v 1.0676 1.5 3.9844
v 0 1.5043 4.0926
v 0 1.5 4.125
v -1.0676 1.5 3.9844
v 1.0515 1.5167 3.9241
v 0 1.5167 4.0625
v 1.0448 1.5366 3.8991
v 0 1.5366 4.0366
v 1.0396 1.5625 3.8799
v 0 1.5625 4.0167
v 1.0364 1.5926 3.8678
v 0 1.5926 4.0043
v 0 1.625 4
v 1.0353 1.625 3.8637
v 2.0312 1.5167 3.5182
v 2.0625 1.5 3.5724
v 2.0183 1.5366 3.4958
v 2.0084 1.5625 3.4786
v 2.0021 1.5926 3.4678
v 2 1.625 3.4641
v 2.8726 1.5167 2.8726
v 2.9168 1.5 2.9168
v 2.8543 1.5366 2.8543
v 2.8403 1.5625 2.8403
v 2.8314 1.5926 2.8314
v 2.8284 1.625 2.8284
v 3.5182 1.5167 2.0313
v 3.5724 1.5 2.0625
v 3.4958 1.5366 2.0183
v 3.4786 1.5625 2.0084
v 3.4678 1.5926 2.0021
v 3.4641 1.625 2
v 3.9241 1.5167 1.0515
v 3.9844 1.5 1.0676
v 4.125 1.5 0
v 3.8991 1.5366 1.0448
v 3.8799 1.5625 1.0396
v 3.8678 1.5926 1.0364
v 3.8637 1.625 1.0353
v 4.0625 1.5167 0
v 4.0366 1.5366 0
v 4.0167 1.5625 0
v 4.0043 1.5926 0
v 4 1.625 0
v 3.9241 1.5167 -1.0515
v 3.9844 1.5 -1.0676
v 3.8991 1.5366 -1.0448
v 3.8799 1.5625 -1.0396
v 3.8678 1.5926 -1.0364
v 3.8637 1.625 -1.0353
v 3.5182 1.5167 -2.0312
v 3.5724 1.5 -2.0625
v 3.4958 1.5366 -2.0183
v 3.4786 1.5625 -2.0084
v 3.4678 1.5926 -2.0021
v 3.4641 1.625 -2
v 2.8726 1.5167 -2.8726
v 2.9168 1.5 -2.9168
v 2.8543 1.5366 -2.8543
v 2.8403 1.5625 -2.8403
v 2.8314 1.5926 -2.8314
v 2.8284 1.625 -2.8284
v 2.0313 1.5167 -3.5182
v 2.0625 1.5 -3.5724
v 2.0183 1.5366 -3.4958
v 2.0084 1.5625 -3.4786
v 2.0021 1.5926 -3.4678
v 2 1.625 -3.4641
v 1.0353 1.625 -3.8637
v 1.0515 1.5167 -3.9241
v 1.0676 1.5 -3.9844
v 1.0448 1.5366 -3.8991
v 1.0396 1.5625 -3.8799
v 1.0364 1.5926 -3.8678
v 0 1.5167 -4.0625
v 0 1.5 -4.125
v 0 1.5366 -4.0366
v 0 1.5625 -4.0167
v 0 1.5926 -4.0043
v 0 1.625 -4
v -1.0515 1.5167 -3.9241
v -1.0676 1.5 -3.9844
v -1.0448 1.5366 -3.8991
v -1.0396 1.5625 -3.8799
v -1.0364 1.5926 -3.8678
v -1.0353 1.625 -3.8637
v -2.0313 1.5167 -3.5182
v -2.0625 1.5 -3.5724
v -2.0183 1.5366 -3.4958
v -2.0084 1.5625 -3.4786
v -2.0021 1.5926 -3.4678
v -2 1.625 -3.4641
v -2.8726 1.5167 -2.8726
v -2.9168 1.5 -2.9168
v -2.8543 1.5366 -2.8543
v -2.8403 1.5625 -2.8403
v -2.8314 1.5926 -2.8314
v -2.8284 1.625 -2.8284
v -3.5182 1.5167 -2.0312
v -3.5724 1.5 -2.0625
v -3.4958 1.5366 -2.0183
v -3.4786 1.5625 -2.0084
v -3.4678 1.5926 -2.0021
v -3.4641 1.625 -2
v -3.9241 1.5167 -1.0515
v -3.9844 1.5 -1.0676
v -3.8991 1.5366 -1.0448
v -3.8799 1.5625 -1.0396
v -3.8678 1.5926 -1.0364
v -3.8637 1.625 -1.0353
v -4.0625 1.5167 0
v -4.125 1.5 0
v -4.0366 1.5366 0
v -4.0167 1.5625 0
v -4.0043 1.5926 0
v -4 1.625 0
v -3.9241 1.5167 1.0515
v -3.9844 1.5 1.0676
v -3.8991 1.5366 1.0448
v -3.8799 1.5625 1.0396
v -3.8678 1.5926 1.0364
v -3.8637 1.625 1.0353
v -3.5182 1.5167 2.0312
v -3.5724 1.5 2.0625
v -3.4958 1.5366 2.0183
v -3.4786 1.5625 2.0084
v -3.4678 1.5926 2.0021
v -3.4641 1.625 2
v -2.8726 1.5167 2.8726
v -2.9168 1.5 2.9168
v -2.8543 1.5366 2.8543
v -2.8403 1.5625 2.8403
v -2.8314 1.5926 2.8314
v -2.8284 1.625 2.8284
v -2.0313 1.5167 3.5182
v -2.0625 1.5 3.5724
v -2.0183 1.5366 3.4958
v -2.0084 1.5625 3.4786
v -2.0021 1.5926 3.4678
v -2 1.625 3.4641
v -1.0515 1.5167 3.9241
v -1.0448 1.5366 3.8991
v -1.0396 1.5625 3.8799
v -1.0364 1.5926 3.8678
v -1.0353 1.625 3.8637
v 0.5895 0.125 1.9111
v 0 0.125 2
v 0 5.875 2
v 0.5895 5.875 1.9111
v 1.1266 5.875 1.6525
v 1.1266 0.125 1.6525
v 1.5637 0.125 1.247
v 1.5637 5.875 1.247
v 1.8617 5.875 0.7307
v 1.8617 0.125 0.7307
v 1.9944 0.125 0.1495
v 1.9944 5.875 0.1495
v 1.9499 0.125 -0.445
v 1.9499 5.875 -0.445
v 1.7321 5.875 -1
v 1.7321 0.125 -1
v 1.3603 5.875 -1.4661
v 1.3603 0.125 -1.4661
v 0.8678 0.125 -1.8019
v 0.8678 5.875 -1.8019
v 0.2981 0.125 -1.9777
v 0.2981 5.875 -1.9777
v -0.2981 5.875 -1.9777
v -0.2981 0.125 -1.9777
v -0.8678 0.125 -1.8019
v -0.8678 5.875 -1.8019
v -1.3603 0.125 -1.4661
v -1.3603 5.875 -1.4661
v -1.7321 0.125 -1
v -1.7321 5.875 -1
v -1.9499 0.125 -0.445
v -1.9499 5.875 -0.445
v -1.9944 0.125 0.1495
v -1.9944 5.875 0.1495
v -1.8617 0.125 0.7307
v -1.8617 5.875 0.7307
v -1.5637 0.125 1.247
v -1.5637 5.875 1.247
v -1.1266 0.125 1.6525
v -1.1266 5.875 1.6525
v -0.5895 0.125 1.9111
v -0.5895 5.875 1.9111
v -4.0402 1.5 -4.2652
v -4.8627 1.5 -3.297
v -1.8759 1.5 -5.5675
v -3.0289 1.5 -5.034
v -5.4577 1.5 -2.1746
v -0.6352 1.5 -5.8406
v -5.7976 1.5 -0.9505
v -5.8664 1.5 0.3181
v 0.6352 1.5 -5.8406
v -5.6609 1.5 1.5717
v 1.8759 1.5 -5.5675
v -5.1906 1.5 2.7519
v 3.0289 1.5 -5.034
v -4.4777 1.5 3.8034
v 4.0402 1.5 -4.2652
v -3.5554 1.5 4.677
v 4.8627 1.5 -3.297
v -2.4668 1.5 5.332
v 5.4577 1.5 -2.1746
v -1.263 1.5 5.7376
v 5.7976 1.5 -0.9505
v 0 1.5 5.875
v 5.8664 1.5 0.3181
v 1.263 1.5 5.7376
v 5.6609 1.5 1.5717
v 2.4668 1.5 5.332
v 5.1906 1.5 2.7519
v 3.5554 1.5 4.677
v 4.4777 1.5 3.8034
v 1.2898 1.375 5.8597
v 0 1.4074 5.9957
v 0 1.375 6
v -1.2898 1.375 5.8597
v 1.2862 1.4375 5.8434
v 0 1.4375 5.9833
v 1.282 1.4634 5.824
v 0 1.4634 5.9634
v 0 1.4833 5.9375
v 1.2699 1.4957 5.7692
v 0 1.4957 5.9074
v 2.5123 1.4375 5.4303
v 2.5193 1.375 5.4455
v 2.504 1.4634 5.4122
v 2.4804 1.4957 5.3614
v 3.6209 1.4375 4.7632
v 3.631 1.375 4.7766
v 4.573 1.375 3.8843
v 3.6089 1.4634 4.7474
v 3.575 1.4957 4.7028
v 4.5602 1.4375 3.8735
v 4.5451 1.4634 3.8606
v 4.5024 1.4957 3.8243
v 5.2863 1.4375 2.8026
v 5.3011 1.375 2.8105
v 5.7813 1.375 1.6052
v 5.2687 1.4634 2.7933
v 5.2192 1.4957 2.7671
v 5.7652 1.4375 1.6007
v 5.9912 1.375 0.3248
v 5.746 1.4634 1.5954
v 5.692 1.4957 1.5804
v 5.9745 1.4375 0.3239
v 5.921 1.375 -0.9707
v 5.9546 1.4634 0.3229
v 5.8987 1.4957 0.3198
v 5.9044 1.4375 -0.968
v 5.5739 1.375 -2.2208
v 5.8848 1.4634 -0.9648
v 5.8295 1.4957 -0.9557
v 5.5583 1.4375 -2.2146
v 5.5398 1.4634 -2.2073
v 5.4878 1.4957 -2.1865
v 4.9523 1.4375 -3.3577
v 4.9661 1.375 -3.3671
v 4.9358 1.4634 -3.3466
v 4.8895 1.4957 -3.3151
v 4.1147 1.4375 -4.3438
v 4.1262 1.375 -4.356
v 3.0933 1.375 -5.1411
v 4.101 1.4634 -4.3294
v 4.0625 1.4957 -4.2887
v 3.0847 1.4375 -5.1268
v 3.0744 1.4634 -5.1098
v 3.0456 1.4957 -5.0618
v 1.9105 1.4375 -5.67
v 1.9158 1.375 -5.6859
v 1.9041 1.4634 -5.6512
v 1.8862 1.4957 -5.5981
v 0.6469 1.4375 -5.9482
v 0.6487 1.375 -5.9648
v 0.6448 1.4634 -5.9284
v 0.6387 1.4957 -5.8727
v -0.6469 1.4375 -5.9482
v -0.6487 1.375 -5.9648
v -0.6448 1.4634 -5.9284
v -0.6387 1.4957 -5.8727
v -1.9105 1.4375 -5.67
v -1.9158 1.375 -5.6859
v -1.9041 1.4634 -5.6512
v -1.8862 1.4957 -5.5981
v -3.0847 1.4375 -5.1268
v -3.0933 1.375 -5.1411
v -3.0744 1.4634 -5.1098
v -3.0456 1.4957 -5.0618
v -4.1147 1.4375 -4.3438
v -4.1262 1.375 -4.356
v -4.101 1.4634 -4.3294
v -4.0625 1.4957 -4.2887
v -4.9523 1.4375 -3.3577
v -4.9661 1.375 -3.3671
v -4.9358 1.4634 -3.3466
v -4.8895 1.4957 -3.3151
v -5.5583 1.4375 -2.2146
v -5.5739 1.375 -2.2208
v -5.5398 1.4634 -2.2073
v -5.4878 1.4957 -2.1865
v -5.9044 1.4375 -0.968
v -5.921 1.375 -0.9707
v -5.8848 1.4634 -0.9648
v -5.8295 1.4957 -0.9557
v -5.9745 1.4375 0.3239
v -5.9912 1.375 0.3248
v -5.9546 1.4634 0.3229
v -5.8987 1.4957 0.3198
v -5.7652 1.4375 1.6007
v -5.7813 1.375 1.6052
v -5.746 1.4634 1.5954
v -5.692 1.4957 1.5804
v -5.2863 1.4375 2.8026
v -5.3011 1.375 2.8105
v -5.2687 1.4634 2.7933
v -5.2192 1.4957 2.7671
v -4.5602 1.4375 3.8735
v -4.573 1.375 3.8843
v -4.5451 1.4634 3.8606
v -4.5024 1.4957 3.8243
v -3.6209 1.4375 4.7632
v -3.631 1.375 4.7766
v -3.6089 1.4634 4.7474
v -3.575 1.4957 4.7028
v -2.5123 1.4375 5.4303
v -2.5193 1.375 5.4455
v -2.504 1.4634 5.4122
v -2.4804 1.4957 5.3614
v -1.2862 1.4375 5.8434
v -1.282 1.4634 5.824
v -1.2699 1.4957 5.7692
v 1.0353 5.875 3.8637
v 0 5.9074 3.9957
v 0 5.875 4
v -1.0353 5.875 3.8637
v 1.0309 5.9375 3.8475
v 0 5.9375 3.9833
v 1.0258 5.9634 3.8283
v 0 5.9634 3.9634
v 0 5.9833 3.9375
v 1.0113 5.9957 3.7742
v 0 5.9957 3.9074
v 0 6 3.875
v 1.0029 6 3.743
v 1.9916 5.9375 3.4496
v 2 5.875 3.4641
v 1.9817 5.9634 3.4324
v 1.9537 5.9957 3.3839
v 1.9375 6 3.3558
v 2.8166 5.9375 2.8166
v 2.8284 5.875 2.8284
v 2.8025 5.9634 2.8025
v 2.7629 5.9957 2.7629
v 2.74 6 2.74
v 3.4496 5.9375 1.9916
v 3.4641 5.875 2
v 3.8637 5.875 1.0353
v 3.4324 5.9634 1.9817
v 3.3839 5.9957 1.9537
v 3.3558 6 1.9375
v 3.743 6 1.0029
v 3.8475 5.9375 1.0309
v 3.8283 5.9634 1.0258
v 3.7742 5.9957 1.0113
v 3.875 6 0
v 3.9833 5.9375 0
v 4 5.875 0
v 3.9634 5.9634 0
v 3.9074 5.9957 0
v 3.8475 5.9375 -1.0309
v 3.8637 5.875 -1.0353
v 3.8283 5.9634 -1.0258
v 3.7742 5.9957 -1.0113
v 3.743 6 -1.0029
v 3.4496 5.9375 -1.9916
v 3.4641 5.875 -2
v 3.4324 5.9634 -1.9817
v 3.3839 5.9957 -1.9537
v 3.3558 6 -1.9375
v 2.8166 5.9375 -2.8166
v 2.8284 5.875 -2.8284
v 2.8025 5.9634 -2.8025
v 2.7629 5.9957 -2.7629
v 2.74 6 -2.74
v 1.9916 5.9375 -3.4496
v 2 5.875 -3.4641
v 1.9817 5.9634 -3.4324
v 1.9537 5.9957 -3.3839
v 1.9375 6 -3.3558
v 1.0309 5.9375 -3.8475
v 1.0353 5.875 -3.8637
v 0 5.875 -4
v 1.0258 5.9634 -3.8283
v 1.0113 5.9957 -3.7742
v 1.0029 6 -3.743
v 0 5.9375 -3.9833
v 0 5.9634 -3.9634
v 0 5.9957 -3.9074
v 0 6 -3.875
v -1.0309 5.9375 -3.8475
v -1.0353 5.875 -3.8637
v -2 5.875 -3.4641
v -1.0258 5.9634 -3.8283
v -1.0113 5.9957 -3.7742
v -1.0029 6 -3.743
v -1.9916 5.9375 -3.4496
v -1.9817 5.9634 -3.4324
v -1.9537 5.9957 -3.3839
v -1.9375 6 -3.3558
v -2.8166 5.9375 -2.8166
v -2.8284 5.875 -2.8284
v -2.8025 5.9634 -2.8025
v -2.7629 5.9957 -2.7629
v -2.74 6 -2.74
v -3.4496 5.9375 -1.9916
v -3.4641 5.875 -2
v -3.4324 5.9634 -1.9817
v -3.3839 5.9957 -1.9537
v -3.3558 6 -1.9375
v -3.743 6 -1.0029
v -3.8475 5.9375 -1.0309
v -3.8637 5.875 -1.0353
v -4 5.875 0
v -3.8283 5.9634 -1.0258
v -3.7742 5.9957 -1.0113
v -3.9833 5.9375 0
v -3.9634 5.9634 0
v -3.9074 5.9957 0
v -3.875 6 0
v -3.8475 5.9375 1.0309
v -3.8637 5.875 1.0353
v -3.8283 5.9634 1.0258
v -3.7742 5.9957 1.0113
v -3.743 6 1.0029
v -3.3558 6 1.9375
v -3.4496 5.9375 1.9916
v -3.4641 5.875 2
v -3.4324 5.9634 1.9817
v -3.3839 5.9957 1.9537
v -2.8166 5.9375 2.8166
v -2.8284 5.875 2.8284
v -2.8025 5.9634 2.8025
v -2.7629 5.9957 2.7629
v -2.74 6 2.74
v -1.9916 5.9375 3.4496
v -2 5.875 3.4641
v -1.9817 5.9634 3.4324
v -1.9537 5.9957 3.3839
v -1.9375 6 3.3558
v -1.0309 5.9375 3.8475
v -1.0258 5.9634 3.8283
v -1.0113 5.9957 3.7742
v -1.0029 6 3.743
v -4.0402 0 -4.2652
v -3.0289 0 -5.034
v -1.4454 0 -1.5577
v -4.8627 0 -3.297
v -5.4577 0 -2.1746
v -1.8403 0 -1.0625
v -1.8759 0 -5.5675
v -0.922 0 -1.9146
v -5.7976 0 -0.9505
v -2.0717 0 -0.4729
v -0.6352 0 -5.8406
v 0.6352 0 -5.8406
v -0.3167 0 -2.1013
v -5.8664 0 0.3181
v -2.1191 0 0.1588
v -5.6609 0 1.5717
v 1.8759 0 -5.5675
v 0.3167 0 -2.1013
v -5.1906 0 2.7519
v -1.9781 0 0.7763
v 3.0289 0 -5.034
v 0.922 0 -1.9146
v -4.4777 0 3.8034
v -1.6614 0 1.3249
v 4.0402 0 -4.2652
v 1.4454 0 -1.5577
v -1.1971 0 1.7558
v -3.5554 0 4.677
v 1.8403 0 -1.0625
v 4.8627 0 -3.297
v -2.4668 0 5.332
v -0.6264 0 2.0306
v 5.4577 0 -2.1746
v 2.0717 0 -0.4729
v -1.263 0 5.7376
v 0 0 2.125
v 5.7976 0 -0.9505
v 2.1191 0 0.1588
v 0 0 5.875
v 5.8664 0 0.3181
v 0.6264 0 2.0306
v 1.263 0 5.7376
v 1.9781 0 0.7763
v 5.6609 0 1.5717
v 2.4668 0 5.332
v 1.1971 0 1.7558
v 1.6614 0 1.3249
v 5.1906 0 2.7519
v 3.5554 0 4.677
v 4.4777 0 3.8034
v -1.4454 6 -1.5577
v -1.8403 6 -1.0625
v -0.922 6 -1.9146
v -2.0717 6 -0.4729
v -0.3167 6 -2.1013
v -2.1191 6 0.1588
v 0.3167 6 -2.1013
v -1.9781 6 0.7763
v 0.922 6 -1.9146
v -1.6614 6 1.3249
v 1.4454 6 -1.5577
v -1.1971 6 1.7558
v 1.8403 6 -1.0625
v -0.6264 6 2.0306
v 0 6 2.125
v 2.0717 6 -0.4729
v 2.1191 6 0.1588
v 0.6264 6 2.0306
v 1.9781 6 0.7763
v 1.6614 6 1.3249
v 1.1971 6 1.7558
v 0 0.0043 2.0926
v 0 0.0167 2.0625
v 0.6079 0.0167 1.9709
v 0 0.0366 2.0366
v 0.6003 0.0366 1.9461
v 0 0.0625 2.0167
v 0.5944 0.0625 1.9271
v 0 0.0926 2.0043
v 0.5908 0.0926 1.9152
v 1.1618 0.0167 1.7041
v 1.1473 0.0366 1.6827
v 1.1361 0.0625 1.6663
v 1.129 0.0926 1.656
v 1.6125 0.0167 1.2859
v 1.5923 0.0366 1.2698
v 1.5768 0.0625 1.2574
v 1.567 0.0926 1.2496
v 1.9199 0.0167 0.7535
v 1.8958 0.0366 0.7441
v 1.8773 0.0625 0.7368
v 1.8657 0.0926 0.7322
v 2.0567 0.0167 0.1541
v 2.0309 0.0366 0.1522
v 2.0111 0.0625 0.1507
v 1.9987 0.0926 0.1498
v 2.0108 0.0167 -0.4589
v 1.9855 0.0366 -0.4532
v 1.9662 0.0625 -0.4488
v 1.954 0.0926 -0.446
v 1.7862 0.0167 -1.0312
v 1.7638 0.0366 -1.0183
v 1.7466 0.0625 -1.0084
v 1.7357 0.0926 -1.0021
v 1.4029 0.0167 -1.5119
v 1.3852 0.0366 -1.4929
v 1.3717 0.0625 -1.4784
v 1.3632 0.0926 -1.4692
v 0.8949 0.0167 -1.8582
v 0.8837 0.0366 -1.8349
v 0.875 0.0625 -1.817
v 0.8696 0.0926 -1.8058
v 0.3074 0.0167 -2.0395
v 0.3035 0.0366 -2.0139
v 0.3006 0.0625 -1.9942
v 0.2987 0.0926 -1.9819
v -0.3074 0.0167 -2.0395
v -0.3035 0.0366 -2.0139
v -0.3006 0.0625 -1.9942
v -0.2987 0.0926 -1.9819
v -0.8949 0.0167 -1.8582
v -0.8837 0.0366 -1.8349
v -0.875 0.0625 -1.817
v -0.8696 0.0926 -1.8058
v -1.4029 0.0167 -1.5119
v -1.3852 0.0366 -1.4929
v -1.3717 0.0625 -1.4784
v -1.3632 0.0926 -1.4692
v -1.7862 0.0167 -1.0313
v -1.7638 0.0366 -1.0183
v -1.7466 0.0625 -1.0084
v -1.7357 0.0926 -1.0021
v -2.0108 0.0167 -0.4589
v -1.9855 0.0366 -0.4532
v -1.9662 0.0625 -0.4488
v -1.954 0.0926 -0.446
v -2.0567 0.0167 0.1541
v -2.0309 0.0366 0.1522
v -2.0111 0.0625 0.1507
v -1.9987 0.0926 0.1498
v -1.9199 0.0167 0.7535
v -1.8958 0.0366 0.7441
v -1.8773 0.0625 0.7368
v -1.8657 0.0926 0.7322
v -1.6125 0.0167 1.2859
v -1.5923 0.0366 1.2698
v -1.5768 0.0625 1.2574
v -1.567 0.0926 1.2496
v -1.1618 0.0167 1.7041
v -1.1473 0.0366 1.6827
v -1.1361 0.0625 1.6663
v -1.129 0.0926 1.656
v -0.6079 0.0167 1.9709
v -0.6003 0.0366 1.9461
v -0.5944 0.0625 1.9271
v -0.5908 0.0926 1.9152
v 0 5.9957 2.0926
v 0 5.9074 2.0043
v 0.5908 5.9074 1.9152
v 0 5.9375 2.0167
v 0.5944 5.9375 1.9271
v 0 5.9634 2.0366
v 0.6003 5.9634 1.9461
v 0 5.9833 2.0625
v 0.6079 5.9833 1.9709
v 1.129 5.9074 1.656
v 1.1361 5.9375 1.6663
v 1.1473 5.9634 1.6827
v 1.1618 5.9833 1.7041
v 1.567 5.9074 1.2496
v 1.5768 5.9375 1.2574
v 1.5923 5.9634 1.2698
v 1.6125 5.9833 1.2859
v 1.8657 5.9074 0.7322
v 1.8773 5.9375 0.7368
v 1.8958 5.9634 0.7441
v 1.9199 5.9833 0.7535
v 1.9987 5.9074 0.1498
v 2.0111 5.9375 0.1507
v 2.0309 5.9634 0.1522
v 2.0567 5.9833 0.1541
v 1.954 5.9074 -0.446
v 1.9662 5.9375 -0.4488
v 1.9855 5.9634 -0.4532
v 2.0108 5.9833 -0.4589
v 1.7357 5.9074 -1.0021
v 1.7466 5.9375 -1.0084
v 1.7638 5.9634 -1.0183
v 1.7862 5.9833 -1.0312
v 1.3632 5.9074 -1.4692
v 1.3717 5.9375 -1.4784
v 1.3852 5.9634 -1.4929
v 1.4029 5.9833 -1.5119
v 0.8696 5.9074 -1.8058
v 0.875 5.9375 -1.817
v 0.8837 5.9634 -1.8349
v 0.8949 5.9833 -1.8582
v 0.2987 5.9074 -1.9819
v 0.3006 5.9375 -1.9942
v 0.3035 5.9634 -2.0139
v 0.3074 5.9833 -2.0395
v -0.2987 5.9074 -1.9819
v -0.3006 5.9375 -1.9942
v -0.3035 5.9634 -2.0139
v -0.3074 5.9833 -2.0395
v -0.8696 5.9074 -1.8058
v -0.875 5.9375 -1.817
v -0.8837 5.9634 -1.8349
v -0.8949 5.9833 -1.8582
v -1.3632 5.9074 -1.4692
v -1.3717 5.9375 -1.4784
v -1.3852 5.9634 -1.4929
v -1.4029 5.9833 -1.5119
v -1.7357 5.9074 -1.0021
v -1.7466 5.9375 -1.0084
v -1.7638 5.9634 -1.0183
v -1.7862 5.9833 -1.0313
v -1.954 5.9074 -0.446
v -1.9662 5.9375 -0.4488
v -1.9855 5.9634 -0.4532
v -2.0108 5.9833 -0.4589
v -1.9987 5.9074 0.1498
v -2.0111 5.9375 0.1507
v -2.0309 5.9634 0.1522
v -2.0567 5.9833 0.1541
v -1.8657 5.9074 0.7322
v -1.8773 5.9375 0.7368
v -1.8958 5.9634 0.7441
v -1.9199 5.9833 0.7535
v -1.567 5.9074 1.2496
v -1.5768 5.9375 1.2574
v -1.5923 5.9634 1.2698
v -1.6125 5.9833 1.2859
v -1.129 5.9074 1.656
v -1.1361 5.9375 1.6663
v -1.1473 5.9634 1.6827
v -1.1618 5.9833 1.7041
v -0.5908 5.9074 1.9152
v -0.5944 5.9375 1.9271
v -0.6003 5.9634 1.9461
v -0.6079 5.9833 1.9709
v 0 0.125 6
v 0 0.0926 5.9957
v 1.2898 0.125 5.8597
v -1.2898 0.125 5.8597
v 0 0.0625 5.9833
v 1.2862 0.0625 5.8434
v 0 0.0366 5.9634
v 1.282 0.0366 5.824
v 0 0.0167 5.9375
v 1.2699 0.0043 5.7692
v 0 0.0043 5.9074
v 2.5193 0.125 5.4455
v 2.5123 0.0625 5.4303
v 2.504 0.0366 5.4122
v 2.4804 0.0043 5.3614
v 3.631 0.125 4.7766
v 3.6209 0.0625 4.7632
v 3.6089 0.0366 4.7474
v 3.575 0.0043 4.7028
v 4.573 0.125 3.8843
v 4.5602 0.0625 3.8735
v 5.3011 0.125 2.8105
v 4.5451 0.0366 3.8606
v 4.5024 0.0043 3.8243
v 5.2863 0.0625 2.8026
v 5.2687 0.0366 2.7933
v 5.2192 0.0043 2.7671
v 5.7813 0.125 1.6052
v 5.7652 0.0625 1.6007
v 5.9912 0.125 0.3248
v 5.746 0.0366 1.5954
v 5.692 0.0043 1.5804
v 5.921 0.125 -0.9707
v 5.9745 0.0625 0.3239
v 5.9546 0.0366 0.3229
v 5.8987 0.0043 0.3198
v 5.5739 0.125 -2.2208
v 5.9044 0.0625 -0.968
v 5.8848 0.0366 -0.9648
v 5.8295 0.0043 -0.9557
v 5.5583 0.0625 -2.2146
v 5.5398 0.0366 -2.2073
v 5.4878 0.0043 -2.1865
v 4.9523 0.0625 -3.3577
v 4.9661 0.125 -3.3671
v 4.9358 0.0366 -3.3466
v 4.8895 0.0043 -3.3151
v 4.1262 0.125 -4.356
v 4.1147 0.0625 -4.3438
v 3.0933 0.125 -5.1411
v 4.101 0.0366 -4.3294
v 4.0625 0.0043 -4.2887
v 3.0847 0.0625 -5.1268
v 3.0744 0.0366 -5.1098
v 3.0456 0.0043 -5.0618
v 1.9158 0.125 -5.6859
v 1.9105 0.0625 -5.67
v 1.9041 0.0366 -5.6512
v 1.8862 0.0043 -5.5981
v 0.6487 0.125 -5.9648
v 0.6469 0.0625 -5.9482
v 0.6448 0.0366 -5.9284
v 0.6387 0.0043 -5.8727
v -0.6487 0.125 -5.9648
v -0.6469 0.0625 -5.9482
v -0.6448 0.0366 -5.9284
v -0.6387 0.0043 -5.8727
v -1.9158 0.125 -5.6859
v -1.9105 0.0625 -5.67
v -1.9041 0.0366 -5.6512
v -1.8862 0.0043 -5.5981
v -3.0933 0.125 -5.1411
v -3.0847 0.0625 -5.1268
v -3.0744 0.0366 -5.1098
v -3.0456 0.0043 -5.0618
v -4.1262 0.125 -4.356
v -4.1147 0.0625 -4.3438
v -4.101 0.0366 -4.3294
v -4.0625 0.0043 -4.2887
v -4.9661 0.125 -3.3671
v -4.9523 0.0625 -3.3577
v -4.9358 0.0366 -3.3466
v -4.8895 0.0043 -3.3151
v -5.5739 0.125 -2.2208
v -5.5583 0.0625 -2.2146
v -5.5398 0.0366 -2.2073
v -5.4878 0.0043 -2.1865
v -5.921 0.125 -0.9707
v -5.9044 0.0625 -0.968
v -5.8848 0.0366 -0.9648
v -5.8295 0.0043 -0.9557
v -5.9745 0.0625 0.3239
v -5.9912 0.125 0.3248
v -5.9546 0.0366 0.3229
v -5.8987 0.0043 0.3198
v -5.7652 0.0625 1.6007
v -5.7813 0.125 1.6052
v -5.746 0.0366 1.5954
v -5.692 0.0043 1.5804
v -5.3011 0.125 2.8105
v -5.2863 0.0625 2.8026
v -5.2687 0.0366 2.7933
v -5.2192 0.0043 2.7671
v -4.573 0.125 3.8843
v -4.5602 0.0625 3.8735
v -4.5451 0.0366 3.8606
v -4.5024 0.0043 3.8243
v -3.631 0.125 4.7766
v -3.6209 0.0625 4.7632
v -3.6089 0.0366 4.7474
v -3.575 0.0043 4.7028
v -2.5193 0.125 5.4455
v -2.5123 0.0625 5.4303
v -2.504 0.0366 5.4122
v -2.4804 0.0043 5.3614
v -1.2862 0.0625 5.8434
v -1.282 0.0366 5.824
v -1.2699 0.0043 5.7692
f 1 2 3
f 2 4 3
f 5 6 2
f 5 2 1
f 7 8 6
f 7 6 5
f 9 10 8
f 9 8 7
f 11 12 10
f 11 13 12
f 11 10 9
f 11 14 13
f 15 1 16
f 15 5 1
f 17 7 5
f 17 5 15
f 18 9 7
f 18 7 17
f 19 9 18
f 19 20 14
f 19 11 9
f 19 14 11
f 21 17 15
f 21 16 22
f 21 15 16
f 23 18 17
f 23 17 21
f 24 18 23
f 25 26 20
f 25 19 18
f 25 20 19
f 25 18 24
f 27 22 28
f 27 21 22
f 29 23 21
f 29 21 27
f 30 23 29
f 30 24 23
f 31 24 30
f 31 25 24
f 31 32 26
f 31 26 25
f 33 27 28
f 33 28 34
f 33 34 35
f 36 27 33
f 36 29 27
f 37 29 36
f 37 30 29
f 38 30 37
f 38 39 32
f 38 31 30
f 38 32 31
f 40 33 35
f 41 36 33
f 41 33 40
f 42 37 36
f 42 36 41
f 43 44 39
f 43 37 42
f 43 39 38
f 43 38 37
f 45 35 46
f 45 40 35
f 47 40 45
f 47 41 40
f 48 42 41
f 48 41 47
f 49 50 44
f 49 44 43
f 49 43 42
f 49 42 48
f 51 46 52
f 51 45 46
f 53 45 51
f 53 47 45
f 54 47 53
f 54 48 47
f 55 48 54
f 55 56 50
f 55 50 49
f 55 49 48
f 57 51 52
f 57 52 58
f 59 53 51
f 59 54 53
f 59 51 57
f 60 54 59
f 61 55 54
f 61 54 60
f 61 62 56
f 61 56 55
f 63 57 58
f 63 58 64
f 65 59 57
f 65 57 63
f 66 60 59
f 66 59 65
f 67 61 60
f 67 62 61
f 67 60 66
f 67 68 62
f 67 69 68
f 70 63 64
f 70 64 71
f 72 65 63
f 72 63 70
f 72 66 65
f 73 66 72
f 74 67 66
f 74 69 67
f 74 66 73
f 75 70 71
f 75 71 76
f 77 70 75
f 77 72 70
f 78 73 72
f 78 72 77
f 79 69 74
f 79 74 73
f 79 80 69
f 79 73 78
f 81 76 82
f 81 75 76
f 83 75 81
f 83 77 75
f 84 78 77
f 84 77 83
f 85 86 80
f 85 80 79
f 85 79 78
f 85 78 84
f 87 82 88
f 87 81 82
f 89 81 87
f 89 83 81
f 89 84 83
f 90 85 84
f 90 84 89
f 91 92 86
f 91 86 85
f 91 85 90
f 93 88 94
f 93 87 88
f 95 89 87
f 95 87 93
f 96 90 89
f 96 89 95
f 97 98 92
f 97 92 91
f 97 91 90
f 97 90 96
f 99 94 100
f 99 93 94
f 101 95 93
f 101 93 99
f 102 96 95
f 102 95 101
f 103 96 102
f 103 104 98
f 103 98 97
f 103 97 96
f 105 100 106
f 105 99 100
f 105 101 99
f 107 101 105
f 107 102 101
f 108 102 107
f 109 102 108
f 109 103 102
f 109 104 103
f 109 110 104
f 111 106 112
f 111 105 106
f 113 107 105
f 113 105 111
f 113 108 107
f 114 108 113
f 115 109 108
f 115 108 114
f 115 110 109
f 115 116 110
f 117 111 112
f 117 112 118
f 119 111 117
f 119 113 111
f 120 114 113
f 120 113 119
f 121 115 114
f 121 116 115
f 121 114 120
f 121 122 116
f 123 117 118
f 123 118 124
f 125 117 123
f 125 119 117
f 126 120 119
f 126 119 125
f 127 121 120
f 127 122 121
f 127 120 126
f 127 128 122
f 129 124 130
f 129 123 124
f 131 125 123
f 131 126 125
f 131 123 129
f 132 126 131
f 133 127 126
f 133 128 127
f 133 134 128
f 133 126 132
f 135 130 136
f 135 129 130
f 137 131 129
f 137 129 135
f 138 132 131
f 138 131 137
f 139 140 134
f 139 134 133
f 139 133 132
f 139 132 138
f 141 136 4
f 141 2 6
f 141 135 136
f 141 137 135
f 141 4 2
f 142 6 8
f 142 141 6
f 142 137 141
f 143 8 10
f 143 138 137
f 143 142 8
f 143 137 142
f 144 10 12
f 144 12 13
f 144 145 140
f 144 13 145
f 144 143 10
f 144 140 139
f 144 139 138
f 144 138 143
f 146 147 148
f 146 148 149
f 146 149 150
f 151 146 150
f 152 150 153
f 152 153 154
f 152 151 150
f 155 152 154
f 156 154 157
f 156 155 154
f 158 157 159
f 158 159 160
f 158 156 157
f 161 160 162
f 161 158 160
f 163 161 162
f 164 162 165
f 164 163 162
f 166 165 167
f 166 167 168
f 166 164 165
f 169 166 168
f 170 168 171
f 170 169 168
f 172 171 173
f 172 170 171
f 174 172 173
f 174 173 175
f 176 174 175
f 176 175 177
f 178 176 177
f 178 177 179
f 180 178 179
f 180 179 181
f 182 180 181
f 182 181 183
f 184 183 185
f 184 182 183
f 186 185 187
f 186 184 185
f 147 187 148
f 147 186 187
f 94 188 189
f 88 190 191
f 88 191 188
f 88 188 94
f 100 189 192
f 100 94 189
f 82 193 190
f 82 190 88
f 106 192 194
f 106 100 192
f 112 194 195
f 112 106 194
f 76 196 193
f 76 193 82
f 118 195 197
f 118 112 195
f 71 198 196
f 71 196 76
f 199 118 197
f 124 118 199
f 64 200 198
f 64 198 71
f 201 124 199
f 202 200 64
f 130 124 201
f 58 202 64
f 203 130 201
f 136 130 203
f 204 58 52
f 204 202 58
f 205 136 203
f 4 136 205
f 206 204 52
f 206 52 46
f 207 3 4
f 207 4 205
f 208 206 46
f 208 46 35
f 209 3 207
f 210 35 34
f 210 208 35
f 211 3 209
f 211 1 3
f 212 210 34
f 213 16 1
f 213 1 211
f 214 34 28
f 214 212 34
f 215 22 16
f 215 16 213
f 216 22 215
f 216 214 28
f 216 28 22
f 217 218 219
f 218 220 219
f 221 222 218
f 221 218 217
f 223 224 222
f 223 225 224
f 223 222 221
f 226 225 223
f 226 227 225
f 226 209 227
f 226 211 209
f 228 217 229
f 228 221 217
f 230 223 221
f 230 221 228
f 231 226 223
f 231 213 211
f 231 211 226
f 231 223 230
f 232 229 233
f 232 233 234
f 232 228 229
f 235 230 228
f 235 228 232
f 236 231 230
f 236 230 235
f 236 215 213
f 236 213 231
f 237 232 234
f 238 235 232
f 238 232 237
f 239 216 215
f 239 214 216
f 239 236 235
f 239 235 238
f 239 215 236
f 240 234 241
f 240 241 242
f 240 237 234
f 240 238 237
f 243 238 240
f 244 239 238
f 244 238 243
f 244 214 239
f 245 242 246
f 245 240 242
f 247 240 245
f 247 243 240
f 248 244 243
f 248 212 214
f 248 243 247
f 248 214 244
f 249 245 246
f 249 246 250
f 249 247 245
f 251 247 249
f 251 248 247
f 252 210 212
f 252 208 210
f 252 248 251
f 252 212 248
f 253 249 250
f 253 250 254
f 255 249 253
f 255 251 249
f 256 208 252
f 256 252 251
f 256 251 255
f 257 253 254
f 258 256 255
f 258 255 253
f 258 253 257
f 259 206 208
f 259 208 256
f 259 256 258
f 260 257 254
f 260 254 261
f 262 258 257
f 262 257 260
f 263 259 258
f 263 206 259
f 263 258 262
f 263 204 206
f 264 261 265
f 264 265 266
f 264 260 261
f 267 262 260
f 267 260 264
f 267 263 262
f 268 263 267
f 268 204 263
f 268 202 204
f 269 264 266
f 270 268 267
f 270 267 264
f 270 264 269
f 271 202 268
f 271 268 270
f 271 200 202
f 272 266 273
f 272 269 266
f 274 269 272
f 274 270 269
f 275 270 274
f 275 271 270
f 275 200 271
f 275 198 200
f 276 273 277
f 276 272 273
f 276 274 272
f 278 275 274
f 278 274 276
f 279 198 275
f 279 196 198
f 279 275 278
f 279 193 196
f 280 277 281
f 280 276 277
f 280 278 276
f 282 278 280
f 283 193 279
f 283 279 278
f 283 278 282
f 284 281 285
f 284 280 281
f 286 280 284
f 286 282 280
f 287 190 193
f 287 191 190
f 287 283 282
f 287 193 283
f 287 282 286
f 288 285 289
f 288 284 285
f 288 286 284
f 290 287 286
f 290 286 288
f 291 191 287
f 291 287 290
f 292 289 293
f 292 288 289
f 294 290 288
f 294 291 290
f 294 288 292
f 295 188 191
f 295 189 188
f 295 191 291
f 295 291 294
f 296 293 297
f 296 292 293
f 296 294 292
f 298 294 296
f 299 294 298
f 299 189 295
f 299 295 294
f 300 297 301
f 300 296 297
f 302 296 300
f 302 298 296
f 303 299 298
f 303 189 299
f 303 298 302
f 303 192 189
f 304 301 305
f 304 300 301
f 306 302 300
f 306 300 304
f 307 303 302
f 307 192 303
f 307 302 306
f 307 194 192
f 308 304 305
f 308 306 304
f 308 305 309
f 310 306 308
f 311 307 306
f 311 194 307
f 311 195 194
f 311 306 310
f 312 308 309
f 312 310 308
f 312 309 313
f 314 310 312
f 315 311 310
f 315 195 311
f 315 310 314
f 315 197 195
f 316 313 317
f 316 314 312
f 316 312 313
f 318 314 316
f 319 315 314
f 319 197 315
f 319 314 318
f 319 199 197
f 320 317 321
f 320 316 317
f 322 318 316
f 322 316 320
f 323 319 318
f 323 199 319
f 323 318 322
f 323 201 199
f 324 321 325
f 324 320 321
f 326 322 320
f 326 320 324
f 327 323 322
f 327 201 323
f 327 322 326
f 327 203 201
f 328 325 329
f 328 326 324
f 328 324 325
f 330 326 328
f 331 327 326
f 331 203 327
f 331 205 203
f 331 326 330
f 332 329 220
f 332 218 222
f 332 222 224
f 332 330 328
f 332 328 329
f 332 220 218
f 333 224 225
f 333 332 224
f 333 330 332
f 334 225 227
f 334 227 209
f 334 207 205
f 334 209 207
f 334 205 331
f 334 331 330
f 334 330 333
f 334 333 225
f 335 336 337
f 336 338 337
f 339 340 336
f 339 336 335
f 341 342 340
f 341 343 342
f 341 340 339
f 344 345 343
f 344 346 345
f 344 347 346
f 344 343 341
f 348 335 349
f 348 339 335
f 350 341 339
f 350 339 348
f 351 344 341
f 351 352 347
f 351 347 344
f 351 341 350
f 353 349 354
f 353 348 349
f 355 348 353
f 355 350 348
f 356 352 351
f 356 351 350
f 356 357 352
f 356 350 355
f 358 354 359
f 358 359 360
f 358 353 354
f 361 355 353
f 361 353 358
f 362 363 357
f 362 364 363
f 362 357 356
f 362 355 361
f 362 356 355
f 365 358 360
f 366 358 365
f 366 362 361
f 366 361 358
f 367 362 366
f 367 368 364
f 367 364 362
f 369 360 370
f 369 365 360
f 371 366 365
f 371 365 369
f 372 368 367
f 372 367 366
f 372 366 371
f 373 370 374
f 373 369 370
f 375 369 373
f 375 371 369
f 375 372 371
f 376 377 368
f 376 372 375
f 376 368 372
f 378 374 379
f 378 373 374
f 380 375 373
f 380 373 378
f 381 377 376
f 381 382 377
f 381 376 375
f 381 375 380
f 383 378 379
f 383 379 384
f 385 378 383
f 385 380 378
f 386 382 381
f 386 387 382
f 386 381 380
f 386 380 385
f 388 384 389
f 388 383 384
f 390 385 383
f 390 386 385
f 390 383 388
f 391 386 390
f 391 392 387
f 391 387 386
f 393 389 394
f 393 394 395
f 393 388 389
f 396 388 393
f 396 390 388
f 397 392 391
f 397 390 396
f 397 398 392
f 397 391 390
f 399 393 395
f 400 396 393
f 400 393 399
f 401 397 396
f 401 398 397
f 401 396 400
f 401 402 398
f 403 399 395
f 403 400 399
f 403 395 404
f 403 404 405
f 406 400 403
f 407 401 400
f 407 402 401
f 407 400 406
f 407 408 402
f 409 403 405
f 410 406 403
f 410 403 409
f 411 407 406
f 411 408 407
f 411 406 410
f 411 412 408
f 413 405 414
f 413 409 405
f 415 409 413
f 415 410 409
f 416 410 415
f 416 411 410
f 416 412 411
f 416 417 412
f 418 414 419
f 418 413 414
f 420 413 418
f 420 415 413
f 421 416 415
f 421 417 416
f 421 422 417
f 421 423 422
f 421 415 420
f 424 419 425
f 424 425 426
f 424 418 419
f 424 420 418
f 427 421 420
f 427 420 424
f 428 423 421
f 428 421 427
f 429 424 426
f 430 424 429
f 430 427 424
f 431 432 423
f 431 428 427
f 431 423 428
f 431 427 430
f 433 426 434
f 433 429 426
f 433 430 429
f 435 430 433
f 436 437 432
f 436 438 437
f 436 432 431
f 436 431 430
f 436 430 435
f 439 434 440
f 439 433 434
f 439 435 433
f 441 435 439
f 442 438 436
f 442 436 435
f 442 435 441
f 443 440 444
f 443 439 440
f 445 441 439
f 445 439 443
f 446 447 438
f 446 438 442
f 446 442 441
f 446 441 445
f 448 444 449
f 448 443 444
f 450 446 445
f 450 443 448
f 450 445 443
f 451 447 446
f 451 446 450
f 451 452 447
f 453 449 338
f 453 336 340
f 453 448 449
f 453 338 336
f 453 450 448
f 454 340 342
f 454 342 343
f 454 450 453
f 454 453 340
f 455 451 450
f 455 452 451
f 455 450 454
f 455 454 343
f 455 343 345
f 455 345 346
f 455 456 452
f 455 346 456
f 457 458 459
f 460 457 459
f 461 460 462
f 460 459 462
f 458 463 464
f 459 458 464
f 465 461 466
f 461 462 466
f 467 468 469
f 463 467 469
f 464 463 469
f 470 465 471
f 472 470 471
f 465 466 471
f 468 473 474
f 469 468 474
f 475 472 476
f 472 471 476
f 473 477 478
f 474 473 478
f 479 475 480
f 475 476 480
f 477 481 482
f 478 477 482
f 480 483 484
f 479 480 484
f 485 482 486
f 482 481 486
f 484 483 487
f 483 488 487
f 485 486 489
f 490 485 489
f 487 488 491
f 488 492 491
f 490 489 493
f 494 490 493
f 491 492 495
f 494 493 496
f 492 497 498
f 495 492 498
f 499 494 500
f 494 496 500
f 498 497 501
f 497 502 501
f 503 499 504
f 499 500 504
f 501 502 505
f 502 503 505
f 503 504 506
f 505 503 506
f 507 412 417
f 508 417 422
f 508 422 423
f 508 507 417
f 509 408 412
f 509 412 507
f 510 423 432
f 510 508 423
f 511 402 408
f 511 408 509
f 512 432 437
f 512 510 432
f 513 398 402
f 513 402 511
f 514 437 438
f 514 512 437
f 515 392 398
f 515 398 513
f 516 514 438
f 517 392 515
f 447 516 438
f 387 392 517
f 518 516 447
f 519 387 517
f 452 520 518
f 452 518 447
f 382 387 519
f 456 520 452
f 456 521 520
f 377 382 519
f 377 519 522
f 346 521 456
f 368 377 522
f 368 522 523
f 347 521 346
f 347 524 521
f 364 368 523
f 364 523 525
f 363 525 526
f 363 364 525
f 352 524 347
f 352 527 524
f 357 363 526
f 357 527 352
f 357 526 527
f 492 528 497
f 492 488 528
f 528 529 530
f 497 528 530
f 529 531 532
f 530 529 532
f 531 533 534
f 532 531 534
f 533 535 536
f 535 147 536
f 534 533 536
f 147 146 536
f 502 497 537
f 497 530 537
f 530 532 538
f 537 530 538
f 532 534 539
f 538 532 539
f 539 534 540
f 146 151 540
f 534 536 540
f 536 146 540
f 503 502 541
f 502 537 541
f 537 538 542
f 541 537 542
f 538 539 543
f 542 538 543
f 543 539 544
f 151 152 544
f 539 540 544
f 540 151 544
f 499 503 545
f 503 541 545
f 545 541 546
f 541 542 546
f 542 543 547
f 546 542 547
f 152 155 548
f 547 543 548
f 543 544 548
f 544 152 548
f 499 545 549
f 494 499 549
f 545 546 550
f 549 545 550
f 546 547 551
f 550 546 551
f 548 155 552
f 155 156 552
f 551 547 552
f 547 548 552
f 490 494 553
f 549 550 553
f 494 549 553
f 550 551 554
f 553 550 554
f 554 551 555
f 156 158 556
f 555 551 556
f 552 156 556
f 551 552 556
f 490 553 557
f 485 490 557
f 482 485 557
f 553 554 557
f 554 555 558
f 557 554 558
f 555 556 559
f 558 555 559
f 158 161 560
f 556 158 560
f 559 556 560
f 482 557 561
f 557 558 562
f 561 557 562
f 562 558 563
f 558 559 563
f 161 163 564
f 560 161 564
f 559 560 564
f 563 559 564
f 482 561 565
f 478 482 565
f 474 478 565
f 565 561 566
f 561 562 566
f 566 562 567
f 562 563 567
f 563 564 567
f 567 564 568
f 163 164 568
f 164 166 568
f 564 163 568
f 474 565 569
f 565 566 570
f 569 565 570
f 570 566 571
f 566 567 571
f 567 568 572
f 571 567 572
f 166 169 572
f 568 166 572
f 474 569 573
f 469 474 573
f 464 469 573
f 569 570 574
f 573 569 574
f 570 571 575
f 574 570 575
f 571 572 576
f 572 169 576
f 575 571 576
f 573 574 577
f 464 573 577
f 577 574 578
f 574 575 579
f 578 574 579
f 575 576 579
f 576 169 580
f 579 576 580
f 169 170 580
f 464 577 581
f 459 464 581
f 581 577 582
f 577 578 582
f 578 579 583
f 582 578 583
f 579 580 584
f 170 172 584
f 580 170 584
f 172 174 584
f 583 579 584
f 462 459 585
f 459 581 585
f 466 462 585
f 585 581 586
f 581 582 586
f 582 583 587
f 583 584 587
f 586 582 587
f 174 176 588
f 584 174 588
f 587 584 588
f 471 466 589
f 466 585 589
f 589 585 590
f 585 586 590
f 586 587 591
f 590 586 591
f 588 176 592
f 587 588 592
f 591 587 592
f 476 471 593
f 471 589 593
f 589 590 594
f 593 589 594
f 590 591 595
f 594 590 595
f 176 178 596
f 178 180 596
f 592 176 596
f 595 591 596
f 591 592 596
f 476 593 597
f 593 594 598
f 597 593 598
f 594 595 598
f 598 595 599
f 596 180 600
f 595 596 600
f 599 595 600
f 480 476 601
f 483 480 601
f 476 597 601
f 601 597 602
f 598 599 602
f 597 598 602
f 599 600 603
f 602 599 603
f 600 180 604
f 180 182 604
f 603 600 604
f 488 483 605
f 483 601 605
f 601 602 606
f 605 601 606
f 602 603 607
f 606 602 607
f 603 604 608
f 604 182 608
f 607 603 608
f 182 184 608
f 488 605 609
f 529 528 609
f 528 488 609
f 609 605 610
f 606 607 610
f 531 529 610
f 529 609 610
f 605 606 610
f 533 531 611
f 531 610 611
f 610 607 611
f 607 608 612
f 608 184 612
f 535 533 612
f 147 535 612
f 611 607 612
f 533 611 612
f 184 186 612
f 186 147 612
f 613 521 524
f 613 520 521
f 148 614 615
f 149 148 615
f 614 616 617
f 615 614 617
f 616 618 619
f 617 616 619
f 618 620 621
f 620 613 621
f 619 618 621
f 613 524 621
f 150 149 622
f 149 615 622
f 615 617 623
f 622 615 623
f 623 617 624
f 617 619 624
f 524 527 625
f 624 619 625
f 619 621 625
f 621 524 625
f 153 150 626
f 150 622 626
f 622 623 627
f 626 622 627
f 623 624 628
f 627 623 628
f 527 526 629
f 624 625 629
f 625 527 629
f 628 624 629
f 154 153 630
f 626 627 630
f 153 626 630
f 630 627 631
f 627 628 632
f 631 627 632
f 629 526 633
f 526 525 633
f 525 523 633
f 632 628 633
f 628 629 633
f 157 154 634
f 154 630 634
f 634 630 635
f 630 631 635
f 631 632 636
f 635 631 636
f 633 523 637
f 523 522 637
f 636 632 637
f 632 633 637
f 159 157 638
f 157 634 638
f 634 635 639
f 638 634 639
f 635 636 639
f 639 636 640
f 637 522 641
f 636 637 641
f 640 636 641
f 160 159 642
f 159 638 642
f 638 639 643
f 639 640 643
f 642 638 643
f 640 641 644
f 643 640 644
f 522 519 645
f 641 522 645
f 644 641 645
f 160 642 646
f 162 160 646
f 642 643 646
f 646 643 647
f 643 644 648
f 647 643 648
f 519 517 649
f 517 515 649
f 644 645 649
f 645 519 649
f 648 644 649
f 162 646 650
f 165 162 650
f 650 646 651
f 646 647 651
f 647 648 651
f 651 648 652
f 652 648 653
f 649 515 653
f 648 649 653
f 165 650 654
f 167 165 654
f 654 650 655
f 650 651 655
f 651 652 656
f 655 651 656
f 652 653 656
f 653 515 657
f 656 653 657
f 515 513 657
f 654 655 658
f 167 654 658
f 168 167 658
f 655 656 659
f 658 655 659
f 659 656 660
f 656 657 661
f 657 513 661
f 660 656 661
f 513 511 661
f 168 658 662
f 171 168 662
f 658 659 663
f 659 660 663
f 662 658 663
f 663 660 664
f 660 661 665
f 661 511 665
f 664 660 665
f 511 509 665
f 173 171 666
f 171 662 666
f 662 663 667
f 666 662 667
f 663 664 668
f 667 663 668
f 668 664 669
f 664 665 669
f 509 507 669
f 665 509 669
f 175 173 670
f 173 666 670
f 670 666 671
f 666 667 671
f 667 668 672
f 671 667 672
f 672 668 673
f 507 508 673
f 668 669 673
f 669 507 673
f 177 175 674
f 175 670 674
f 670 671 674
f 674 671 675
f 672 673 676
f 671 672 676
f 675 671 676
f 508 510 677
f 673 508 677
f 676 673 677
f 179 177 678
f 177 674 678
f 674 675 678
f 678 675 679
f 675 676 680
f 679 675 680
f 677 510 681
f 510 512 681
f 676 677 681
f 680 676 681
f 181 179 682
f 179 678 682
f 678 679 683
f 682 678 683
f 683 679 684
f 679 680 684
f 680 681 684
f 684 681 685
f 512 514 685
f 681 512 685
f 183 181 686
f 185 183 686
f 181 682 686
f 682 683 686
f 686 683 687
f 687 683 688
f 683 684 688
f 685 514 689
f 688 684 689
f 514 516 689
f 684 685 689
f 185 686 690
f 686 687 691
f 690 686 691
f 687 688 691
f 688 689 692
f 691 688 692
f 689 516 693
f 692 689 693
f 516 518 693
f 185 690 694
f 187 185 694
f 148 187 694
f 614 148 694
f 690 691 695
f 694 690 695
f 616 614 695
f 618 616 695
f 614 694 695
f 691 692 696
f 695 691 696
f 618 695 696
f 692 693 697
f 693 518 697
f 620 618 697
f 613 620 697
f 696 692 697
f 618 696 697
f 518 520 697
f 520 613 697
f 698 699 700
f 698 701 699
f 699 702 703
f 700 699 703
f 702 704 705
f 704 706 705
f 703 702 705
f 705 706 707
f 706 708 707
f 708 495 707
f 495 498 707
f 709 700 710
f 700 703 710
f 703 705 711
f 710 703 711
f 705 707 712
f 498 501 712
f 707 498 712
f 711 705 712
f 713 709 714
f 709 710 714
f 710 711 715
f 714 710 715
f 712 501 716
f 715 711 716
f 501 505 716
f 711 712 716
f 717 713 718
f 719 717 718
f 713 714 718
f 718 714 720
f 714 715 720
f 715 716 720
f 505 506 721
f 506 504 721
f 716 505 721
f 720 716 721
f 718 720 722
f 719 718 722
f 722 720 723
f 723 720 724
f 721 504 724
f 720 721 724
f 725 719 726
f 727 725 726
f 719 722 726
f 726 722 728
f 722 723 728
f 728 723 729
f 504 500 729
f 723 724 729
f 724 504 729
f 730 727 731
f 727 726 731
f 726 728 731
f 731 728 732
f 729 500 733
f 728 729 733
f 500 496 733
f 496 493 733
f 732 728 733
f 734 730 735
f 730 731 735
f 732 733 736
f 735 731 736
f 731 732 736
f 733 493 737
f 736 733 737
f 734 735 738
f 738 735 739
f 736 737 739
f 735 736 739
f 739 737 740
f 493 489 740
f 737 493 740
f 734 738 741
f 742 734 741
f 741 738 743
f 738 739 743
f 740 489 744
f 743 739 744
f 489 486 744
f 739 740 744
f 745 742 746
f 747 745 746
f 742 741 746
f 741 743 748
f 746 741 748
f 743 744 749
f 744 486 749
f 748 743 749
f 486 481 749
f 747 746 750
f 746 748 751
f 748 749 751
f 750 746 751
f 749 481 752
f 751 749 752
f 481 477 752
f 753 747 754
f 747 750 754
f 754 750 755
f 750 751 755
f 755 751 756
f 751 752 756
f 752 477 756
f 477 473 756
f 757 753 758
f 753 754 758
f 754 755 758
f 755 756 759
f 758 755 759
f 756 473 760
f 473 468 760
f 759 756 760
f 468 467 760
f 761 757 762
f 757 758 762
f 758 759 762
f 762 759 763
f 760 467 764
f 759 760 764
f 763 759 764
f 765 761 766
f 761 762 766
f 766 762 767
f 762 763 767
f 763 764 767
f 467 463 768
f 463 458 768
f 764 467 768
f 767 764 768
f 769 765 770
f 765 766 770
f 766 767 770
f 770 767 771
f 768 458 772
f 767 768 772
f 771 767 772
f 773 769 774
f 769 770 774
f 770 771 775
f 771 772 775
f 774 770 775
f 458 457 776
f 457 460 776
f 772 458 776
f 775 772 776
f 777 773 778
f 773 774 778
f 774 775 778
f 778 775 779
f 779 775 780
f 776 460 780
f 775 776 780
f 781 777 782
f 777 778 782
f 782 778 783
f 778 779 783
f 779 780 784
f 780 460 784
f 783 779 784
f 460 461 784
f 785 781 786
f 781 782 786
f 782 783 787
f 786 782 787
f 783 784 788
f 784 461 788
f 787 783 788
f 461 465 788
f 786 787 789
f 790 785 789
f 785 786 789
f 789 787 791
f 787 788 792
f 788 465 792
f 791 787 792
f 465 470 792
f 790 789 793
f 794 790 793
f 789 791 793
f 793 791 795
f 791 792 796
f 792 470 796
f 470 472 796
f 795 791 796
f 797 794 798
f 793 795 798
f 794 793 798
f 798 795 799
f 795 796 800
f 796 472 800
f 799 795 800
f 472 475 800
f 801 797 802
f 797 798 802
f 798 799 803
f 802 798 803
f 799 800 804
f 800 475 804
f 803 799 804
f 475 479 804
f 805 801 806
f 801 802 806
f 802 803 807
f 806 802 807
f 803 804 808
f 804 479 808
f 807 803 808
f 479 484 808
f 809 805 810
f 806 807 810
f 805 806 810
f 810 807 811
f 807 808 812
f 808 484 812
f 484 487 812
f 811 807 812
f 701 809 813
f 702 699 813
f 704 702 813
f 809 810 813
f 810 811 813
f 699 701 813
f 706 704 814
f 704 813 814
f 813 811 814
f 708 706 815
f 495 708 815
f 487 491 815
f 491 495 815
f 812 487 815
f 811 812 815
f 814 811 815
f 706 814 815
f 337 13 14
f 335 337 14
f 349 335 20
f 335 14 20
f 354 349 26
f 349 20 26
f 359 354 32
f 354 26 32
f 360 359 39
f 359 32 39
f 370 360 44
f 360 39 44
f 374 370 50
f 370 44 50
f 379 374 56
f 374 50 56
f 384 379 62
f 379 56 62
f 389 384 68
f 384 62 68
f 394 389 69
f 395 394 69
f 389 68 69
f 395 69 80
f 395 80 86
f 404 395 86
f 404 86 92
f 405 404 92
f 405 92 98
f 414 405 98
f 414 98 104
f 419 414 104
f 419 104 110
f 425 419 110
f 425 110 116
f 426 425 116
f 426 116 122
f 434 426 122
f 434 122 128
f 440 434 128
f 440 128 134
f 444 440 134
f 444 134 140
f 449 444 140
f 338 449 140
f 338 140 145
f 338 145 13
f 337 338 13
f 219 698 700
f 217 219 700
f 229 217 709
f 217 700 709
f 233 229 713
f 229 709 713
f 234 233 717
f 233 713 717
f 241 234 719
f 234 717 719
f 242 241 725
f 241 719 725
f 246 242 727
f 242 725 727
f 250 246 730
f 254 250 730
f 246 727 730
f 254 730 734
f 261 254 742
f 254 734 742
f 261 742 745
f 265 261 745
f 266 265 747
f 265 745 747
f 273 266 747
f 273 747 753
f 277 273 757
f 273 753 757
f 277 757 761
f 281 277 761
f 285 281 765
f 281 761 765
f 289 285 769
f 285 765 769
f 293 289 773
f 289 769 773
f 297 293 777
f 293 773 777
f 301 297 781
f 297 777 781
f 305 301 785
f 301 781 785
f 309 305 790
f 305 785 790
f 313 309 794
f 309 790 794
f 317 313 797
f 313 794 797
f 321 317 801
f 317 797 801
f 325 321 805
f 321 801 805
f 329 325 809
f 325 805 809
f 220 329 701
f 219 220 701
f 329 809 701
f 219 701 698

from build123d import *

# Parameters (mm, degrees)
SKETCH3_R           = 4
SKETCH3_R_2         = 2
BOSS_EXTRUDE1_DEPTH = 6
SKETCH4_R           = 6
SKETCH4_R_2         = 4
BOSS_EXTRUDE2_DEPTH = 1.5
FILLET1_R           = 0.125


with BuildPart() as part:
    # Sketch3 → Boss-Extrude1 (new body)
    with BuildSketch(Plane(origin=(0, 0, 0), x_dir=(1, 0, 0), z_dir=(0, 1, 0))):
        with Locations(Location((0, 0, 0), (0, 0, 270))):
            Circle(SKETCH3_R)
        with Locations(Location((0, 0, 0), (0, 0, 270))):
            Circle(SKETCH3_R_2, mode=Mode.SUBTRACT)
    extrude(amount=BOSS_EXTRUDE1_DEPTH)

    # Sketch4 → Boss-Extrude2 (add)
    with BuildSketch(Plane(origin=(0, 0, 0), x_dir=(1, 0, 0), z_dir=(0, 1, 0))):
        with Locations(Location((0, 0, 0), (0, 0, 270))):
            Circle(SKETCH4_R)
        with Locations(Location((0, 0, 0), (0, 0, 270))):
            Circle(SKETCH4_R_2, mode=Mode.SUBTRACT)
    extrude(amount=BOSS_EXTRUDE2_DEPTH)

    # Fillet1
    fillet1_edges = [part.edges().sort_by_distance(p)[0] for p in [
        (0, 1.5, -6),
        (0, 0, -6),
        (0, 1.5, -4),
        (0, 6, -4),
        (0, 0, -2),
        (0, 6, -2),
    ]]
    fillet(fillet1_edges, radius=FILLET1_R)


solid = part.part
